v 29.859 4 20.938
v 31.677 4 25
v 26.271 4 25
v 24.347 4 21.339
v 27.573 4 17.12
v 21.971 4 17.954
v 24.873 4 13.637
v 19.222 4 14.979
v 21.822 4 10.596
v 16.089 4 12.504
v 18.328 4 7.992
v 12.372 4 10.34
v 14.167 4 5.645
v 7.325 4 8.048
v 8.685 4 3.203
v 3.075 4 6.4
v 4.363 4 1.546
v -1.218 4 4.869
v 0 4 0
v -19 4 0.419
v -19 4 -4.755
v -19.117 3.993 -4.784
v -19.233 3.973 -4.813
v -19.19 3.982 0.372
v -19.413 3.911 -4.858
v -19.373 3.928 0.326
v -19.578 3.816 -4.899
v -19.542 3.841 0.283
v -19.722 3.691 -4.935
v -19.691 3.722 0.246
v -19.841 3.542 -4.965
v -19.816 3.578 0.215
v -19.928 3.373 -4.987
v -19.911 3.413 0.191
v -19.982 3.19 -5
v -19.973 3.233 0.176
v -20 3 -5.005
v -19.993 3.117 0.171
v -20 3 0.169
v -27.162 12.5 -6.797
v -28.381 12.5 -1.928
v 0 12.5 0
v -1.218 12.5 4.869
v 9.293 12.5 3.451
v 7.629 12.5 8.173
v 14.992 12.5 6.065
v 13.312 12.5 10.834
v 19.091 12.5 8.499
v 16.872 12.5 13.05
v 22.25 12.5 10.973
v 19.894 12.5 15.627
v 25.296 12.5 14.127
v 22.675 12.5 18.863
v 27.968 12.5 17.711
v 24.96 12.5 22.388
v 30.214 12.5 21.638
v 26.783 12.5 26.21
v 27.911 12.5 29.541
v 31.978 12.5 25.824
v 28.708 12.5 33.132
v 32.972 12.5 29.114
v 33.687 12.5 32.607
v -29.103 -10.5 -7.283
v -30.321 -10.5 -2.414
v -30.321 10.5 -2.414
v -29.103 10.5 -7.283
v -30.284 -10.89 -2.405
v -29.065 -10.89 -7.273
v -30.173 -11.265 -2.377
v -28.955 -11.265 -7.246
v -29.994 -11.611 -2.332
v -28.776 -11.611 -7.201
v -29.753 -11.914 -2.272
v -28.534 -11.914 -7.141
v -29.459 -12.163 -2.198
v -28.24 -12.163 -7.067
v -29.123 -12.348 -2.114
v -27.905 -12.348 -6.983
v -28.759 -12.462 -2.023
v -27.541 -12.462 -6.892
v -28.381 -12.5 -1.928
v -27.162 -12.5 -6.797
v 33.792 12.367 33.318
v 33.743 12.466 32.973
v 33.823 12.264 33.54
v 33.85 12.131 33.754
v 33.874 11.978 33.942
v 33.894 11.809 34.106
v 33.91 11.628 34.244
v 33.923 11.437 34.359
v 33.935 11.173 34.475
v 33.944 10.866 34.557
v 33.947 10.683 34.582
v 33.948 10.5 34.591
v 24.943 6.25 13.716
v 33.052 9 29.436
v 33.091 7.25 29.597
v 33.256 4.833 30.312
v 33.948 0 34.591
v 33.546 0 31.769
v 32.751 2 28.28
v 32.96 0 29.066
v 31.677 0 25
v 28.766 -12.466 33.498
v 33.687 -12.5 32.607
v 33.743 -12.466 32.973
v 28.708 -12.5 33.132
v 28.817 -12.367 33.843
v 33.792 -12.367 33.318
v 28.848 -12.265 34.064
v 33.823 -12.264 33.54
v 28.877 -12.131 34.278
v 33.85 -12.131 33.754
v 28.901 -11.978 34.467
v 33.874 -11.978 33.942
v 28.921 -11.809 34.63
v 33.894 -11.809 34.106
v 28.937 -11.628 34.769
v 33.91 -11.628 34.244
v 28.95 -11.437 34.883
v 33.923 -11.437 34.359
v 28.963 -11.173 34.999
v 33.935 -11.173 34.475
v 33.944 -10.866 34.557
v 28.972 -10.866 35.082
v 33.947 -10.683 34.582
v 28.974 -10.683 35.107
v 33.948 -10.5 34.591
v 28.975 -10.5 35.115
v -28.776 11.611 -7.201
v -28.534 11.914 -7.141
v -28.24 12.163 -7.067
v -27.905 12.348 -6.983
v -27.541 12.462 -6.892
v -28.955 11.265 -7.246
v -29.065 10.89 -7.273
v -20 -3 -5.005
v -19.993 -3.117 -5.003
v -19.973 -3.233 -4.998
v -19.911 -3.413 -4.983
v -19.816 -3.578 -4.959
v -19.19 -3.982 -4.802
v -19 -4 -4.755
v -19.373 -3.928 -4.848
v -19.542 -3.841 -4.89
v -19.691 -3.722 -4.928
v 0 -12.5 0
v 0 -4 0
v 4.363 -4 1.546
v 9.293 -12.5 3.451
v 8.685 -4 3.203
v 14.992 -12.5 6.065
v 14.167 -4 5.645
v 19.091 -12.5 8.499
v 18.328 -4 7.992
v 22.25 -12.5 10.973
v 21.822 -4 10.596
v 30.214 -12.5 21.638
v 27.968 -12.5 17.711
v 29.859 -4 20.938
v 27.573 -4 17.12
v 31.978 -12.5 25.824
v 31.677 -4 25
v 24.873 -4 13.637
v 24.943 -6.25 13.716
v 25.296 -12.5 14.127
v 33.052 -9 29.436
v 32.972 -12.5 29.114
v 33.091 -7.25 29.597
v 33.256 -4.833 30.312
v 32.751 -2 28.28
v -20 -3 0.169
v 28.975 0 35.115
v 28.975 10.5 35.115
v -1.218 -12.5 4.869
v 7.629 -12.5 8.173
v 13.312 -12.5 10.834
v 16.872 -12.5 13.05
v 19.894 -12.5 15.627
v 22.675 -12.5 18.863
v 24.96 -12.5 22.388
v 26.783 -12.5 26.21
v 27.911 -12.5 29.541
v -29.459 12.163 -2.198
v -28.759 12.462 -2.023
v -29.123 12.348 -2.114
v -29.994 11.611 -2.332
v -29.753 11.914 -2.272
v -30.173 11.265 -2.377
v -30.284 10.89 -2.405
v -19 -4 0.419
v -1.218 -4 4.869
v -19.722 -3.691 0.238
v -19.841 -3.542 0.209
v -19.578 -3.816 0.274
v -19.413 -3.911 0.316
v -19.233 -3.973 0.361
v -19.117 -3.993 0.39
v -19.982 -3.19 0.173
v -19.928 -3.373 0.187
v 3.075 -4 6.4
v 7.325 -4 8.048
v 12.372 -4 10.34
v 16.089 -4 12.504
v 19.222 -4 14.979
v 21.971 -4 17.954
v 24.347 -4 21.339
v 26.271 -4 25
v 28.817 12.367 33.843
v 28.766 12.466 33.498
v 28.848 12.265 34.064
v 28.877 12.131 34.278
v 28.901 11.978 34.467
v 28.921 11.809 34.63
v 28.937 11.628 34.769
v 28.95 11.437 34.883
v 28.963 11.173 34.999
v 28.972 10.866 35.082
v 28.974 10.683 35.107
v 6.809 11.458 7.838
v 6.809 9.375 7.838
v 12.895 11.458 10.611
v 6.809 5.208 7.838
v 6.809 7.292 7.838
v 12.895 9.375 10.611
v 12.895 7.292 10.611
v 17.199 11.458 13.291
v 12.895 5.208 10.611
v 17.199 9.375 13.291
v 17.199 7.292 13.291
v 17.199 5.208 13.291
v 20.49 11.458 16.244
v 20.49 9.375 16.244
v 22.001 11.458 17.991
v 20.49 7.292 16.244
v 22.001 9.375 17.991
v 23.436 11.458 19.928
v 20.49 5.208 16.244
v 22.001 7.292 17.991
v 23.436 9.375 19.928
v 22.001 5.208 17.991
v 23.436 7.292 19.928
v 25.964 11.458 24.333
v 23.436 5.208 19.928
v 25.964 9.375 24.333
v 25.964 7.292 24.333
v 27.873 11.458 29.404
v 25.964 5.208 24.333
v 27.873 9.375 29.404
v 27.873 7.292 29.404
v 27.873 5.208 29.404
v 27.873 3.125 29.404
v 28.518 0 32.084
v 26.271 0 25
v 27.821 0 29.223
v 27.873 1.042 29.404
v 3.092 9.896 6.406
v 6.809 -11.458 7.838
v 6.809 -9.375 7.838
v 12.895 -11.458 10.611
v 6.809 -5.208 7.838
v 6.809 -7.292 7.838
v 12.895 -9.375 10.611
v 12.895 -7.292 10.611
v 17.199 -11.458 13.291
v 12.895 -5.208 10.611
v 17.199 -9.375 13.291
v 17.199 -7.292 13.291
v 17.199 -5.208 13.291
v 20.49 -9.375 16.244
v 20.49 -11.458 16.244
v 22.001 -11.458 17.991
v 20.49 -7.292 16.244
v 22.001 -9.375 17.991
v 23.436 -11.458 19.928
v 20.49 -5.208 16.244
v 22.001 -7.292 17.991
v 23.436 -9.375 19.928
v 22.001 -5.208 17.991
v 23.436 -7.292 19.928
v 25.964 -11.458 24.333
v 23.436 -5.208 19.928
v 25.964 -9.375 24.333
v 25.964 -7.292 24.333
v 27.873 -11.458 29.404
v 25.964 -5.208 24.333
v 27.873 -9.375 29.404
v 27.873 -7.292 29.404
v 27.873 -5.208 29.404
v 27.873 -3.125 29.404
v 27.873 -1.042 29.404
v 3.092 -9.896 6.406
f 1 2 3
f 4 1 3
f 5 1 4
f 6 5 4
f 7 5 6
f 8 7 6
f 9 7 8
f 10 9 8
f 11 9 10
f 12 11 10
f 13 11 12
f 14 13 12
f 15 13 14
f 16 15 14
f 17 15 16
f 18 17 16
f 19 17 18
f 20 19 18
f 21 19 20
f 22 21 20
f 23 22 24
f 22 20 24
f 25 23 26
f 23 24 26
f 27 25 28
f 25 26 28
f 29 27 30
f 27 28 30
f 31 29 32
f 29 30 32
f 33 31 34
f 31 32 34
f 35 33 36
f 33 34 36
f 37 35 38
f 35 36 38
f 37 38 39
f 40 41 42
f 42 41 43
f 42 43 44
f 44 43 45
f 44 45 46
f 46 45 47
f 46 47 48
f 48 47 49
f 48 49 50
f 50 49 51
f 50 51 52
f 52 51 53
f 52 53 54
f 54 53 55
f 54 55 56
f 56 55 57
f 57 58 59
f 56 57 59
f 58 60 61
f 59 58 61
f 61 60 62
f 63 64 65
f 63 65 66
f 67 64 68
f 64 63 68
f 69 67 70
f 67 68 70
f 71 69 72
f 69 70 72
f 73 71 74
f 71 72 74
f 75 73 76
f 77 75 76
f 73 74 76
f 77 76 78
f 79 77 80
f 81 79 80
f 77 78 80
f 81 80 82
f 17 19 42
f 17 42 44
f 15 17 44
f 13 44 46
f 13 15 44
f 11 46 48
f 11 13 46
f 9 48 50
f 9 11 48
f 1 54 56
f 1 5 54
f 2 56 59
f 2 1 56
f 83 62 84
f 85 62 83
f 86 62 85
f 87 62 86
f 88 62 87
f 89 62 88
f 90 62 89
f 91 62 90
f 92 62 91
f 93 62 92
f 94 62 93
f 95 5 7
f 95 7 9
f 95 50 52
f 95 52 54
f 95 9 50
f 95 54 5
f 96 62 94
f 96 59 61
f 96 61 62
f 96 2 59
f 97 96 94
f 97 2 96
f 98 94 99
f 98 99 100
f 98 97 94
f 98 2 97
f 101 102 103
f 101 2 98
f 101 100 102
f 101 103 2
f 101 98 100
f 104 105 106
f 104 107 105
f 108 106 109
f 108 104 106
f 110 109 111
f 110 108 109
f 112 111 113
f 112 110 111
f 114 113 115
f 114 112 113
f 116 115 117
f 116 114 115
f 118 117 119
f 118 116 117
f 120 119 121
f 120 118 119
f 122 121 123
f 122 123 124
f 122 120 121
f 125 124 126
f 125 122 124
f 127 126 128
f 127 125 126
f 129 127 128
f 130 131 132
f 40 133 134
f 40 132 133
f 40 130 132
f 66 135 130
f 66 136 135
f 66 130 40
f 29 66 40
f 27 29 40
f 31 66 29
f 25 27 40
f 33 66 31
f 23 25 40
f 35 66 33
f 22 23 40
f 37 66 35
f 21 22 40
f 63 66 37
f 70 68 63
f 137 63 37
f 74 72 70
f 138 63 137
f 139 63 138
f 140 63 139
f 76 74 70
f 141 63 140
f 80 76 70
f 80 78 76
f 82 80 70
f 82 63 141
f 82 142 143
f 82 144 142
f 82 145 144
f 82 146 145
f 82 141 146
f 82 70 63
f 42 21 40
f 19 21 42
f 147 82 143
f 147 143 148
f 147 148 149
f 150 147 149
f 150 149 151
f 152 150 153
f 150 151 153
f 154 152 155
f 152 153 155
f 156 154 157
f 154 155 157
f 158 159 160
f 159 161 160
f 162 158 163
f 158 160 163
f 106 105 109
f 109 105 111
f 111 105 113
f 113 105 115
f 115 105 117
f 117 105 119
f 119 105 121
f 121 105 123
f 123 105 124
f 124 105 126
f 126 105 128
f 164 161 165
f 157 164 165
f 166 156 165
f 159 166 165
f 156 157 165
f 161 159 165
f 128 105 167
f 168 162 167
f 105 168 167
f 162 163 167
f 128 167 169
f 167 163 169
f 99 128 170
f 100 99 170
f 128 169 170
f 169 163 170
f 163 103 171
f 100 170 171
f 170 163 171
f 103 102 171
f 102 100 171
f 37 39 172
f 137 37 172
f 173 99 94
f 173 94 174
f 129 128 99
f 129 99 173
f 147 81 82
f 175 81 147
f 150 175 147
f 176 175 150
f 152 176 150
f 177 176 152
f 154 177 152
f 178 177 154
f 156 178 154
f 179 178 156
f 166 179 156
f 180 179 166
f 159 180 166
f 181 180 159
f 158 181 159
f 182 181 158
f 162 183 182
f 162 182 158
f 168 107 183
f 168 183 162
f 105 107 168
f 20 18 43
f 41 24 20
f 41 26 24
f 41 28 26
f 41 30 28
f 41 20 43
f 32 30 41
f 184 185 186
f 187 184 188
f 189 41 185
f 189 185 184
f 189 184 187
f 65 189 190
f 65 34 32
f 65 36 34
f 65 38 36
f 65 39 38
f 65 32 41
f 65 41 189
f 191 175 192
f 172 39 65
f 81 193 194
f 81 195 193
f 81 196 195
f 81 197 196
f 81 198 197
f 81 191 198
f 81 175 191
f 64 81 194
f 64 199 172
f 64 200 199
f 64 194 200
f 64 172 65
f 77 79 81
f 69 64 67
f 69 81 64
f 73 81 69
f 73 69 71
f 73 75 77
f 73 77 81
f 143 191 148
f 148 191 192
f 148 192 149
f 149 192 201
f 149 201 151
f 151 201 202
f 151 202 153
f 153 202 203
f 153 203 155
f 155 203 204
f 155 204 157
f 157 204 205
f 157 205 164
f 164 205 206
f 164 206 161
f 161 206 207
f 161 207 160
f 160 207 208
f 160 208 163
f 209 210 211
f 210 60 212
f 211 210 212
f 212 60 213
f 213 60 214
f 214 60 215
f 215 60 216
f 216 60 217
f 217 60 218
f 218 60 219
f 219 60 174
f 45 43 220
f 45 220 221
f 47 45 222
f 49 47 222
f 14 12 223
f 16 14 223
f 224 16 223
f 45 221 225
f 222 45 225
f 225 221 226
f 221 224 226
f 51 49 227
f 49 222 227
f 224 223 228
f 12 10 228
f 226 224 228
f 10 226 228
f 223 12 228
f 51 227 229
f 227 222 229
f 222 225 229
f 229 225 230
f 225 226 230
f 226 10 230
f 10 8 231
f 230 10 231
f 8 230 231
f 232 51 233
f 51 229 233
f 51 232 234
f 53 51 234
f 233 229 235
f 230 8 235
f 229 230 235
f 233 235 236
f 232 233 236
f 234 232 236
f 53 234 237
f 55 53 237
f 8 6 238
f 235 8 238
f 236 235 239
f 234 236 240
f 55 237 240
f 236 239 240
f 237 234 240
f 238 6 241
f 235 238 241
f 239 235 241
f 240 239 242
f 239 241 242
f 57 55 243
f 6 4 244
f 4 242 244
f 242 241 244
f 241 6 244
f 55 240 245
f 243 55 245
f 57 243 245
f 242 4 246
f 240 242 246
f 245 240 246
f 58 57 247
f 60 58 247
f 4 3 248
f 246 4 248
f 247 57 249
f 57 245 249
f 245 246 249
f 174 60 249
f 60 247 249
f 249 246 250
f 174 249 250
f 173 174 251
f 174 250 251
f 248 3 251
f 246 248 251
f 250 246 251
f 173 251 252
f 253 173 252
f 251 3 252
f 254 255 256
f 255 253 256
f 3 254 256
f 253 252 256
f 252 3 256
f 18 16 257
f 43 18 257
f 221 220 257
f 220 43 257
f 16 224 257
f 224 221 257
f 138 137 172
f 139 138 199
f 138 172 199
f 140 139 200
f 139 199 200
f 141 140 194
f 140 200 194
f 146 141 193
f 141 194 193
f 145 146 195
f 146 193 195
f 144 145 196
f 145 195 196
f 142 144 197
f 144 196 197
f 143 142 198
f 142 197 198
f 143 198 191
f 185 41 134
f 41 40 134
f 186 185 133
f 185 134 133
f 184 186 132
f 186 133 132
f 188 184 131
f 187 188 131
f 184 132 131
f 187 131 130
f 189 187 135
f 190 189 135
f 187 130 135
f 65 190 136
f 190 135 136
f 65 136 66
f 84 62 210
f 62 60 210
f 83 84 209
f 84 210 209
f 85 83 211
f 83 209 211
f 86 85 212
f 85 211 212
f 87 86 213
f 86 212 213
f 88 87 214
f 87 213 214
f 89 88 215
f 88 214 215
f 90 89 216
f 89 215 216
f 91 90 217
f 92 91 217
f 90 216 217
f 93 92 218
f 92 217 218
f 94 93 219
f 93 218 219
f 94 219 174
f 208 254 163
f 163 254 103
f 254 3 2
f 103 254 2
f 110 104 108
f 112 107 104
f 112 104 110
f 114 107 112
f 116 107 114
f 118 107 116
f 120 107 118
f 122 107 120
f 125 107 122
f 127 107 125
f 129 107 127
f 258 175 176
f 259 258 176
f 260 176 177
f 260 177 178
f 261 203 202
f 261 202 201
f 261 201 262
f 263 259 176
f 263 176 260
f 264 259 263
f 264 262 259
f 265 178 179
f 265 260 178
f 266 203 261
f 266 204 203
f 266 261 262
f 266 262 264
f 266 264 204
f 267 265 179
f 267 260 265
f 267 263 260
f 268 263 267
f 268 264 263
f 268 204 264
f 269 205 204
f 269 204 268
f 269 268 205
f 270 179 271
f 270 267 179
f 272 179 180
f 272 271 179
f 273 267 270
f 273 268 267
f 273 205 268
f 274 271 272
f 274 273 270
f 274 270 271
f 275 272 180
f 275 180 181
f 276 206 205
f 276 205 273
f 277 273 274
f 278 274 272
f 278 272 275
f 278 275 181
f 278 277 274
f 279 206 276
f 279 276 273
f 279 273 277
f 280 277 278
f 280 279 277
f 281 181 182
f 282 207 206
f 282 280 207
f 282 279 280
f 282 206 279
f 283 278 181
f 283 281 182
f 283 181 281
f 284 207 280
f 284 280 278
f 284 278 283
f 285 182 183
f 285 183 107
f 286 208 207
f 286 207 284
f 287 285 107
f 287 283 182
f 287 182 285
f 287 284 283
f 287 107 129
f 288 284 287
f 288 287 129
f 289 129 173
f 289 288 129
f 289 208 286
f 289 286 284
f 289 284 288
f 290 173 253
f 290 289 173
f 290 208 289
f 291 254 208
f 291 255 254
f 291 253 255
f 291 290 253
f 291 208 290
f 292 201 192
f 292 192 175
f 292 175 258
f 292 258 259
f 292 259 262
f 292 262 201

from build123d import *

# Parameters (mm, degrees)
F1_DEPTH      = 12.5
F1_DEPTH_BACK = 12.5
F2_R          = 2
F4_DEPTH      = 25
F4_DEPTH_BACK = 25


# Not quite as in the source:
# - ends of sketch curves that miss each other by under 0.0002 mm in the source are joined
# - the dataset's text gives a spline's control points without its knots; the knots are read off the source's solid


with BuildPart() as f1:
    # F0 (on Front) → F1 (new body, two sides)
    with BuildSketch(Plane.XZ) as f1_sk:
        with BuildLine():
            Line((-1.2184032821, 4.8688166534), (0, 0))
            add(Edge.make_bspline(
                [(0, 0), (13.9942302595, 4.8154504329), (25.3093838267, 10.870907846), (33.031907279, 25.9106602745), (33.9476719961, 34.5905660178)],
                knots=[0, 0, 0, 0, 0.5280763551, 1, 1, 1, 1], degree=3))
            Line((33.9476719961, 34.5905660178), (28.975269547, 35.1151743323))
            add(Edge.make_bspline(
                [(-1.2184032821, 4.8688166534), (1.8648217541, 5.9349029149), (7.287113618, 7.9315285829), (12.1983004489, 10.1724794599), (15.2865186932, 11.9439955294), (17.2413608312, 13.281183998), (18.9416466936, 14.6787902185), (20.2373870468, 15.9523435041), (21.2534611324, 17.0823993837), (22.2542990458, 18.283251609), (23.9332185037, 20.5443961427), (26.0676758341, 24.2225990158), (28.0070847052, 29.2983814533), (28.7632711893, 33.1057872835), (28.975269547, 35.1151743323)],
                knots=[0.0052558834, 0.0052558834, 0.0052558834, 0.0052558834, 0.125, 0.25, 0.3125, 0.375, 0.4375, 0.5, 0.53125, 0.5625, 0.625, 0.75, 0.875, 1, 1, 1, 1], degree=3))
        make_face()
        Polygon((-29.1025877416, -7.2828144797), (0, 0), (-1.2184032821, 4.8688166534), (-30.3209910237, -2.4139978263), align=None)
    extrude(amount=F1_DEPTH)
    extrude(f1_sk.sketch, amount=-F1_DEPTH_BACK)

    # F2
    f2_edges = [f1.edges().sort_by_distance(p)[0] for p in [
        (31.461471, -12.5, 34.85287),
        (31.461471, 12.5, 34.85287),
        (-29.711789, -12.5, -4.848406),
        (-29.711789, 12.5, -4.848406),
    ]]
    fillet(f2_edges, radius=F2_R)

    # F3 (on Top) → F4 (cut, two sides)
    with BuildSketch(Plane.XY) as f4_sk:
        with BuildLine():
            Line((-19, -4), (50, -4))
            Line((50, -4), (50, 4))
            Line((50, 4), (-19, 4))
            ThreePointArc((-19, 4), (-19.7071067812, 3.7071067812), (-20, 3))
            Line((-20, 3), (-20, -3))
            ThreePointArc((-20, -3), (-19.7071067812, -3.7071067812), (-19, -4))
        make_face()
    extrude(amount=F4_DEPTH, mode=Mode.SUBTRACT)
    extrude(f4_sk.sketch, amount=-F4_DEPTH_BACK, mode=Mode.SUBTRACT)


solid = f1.part
